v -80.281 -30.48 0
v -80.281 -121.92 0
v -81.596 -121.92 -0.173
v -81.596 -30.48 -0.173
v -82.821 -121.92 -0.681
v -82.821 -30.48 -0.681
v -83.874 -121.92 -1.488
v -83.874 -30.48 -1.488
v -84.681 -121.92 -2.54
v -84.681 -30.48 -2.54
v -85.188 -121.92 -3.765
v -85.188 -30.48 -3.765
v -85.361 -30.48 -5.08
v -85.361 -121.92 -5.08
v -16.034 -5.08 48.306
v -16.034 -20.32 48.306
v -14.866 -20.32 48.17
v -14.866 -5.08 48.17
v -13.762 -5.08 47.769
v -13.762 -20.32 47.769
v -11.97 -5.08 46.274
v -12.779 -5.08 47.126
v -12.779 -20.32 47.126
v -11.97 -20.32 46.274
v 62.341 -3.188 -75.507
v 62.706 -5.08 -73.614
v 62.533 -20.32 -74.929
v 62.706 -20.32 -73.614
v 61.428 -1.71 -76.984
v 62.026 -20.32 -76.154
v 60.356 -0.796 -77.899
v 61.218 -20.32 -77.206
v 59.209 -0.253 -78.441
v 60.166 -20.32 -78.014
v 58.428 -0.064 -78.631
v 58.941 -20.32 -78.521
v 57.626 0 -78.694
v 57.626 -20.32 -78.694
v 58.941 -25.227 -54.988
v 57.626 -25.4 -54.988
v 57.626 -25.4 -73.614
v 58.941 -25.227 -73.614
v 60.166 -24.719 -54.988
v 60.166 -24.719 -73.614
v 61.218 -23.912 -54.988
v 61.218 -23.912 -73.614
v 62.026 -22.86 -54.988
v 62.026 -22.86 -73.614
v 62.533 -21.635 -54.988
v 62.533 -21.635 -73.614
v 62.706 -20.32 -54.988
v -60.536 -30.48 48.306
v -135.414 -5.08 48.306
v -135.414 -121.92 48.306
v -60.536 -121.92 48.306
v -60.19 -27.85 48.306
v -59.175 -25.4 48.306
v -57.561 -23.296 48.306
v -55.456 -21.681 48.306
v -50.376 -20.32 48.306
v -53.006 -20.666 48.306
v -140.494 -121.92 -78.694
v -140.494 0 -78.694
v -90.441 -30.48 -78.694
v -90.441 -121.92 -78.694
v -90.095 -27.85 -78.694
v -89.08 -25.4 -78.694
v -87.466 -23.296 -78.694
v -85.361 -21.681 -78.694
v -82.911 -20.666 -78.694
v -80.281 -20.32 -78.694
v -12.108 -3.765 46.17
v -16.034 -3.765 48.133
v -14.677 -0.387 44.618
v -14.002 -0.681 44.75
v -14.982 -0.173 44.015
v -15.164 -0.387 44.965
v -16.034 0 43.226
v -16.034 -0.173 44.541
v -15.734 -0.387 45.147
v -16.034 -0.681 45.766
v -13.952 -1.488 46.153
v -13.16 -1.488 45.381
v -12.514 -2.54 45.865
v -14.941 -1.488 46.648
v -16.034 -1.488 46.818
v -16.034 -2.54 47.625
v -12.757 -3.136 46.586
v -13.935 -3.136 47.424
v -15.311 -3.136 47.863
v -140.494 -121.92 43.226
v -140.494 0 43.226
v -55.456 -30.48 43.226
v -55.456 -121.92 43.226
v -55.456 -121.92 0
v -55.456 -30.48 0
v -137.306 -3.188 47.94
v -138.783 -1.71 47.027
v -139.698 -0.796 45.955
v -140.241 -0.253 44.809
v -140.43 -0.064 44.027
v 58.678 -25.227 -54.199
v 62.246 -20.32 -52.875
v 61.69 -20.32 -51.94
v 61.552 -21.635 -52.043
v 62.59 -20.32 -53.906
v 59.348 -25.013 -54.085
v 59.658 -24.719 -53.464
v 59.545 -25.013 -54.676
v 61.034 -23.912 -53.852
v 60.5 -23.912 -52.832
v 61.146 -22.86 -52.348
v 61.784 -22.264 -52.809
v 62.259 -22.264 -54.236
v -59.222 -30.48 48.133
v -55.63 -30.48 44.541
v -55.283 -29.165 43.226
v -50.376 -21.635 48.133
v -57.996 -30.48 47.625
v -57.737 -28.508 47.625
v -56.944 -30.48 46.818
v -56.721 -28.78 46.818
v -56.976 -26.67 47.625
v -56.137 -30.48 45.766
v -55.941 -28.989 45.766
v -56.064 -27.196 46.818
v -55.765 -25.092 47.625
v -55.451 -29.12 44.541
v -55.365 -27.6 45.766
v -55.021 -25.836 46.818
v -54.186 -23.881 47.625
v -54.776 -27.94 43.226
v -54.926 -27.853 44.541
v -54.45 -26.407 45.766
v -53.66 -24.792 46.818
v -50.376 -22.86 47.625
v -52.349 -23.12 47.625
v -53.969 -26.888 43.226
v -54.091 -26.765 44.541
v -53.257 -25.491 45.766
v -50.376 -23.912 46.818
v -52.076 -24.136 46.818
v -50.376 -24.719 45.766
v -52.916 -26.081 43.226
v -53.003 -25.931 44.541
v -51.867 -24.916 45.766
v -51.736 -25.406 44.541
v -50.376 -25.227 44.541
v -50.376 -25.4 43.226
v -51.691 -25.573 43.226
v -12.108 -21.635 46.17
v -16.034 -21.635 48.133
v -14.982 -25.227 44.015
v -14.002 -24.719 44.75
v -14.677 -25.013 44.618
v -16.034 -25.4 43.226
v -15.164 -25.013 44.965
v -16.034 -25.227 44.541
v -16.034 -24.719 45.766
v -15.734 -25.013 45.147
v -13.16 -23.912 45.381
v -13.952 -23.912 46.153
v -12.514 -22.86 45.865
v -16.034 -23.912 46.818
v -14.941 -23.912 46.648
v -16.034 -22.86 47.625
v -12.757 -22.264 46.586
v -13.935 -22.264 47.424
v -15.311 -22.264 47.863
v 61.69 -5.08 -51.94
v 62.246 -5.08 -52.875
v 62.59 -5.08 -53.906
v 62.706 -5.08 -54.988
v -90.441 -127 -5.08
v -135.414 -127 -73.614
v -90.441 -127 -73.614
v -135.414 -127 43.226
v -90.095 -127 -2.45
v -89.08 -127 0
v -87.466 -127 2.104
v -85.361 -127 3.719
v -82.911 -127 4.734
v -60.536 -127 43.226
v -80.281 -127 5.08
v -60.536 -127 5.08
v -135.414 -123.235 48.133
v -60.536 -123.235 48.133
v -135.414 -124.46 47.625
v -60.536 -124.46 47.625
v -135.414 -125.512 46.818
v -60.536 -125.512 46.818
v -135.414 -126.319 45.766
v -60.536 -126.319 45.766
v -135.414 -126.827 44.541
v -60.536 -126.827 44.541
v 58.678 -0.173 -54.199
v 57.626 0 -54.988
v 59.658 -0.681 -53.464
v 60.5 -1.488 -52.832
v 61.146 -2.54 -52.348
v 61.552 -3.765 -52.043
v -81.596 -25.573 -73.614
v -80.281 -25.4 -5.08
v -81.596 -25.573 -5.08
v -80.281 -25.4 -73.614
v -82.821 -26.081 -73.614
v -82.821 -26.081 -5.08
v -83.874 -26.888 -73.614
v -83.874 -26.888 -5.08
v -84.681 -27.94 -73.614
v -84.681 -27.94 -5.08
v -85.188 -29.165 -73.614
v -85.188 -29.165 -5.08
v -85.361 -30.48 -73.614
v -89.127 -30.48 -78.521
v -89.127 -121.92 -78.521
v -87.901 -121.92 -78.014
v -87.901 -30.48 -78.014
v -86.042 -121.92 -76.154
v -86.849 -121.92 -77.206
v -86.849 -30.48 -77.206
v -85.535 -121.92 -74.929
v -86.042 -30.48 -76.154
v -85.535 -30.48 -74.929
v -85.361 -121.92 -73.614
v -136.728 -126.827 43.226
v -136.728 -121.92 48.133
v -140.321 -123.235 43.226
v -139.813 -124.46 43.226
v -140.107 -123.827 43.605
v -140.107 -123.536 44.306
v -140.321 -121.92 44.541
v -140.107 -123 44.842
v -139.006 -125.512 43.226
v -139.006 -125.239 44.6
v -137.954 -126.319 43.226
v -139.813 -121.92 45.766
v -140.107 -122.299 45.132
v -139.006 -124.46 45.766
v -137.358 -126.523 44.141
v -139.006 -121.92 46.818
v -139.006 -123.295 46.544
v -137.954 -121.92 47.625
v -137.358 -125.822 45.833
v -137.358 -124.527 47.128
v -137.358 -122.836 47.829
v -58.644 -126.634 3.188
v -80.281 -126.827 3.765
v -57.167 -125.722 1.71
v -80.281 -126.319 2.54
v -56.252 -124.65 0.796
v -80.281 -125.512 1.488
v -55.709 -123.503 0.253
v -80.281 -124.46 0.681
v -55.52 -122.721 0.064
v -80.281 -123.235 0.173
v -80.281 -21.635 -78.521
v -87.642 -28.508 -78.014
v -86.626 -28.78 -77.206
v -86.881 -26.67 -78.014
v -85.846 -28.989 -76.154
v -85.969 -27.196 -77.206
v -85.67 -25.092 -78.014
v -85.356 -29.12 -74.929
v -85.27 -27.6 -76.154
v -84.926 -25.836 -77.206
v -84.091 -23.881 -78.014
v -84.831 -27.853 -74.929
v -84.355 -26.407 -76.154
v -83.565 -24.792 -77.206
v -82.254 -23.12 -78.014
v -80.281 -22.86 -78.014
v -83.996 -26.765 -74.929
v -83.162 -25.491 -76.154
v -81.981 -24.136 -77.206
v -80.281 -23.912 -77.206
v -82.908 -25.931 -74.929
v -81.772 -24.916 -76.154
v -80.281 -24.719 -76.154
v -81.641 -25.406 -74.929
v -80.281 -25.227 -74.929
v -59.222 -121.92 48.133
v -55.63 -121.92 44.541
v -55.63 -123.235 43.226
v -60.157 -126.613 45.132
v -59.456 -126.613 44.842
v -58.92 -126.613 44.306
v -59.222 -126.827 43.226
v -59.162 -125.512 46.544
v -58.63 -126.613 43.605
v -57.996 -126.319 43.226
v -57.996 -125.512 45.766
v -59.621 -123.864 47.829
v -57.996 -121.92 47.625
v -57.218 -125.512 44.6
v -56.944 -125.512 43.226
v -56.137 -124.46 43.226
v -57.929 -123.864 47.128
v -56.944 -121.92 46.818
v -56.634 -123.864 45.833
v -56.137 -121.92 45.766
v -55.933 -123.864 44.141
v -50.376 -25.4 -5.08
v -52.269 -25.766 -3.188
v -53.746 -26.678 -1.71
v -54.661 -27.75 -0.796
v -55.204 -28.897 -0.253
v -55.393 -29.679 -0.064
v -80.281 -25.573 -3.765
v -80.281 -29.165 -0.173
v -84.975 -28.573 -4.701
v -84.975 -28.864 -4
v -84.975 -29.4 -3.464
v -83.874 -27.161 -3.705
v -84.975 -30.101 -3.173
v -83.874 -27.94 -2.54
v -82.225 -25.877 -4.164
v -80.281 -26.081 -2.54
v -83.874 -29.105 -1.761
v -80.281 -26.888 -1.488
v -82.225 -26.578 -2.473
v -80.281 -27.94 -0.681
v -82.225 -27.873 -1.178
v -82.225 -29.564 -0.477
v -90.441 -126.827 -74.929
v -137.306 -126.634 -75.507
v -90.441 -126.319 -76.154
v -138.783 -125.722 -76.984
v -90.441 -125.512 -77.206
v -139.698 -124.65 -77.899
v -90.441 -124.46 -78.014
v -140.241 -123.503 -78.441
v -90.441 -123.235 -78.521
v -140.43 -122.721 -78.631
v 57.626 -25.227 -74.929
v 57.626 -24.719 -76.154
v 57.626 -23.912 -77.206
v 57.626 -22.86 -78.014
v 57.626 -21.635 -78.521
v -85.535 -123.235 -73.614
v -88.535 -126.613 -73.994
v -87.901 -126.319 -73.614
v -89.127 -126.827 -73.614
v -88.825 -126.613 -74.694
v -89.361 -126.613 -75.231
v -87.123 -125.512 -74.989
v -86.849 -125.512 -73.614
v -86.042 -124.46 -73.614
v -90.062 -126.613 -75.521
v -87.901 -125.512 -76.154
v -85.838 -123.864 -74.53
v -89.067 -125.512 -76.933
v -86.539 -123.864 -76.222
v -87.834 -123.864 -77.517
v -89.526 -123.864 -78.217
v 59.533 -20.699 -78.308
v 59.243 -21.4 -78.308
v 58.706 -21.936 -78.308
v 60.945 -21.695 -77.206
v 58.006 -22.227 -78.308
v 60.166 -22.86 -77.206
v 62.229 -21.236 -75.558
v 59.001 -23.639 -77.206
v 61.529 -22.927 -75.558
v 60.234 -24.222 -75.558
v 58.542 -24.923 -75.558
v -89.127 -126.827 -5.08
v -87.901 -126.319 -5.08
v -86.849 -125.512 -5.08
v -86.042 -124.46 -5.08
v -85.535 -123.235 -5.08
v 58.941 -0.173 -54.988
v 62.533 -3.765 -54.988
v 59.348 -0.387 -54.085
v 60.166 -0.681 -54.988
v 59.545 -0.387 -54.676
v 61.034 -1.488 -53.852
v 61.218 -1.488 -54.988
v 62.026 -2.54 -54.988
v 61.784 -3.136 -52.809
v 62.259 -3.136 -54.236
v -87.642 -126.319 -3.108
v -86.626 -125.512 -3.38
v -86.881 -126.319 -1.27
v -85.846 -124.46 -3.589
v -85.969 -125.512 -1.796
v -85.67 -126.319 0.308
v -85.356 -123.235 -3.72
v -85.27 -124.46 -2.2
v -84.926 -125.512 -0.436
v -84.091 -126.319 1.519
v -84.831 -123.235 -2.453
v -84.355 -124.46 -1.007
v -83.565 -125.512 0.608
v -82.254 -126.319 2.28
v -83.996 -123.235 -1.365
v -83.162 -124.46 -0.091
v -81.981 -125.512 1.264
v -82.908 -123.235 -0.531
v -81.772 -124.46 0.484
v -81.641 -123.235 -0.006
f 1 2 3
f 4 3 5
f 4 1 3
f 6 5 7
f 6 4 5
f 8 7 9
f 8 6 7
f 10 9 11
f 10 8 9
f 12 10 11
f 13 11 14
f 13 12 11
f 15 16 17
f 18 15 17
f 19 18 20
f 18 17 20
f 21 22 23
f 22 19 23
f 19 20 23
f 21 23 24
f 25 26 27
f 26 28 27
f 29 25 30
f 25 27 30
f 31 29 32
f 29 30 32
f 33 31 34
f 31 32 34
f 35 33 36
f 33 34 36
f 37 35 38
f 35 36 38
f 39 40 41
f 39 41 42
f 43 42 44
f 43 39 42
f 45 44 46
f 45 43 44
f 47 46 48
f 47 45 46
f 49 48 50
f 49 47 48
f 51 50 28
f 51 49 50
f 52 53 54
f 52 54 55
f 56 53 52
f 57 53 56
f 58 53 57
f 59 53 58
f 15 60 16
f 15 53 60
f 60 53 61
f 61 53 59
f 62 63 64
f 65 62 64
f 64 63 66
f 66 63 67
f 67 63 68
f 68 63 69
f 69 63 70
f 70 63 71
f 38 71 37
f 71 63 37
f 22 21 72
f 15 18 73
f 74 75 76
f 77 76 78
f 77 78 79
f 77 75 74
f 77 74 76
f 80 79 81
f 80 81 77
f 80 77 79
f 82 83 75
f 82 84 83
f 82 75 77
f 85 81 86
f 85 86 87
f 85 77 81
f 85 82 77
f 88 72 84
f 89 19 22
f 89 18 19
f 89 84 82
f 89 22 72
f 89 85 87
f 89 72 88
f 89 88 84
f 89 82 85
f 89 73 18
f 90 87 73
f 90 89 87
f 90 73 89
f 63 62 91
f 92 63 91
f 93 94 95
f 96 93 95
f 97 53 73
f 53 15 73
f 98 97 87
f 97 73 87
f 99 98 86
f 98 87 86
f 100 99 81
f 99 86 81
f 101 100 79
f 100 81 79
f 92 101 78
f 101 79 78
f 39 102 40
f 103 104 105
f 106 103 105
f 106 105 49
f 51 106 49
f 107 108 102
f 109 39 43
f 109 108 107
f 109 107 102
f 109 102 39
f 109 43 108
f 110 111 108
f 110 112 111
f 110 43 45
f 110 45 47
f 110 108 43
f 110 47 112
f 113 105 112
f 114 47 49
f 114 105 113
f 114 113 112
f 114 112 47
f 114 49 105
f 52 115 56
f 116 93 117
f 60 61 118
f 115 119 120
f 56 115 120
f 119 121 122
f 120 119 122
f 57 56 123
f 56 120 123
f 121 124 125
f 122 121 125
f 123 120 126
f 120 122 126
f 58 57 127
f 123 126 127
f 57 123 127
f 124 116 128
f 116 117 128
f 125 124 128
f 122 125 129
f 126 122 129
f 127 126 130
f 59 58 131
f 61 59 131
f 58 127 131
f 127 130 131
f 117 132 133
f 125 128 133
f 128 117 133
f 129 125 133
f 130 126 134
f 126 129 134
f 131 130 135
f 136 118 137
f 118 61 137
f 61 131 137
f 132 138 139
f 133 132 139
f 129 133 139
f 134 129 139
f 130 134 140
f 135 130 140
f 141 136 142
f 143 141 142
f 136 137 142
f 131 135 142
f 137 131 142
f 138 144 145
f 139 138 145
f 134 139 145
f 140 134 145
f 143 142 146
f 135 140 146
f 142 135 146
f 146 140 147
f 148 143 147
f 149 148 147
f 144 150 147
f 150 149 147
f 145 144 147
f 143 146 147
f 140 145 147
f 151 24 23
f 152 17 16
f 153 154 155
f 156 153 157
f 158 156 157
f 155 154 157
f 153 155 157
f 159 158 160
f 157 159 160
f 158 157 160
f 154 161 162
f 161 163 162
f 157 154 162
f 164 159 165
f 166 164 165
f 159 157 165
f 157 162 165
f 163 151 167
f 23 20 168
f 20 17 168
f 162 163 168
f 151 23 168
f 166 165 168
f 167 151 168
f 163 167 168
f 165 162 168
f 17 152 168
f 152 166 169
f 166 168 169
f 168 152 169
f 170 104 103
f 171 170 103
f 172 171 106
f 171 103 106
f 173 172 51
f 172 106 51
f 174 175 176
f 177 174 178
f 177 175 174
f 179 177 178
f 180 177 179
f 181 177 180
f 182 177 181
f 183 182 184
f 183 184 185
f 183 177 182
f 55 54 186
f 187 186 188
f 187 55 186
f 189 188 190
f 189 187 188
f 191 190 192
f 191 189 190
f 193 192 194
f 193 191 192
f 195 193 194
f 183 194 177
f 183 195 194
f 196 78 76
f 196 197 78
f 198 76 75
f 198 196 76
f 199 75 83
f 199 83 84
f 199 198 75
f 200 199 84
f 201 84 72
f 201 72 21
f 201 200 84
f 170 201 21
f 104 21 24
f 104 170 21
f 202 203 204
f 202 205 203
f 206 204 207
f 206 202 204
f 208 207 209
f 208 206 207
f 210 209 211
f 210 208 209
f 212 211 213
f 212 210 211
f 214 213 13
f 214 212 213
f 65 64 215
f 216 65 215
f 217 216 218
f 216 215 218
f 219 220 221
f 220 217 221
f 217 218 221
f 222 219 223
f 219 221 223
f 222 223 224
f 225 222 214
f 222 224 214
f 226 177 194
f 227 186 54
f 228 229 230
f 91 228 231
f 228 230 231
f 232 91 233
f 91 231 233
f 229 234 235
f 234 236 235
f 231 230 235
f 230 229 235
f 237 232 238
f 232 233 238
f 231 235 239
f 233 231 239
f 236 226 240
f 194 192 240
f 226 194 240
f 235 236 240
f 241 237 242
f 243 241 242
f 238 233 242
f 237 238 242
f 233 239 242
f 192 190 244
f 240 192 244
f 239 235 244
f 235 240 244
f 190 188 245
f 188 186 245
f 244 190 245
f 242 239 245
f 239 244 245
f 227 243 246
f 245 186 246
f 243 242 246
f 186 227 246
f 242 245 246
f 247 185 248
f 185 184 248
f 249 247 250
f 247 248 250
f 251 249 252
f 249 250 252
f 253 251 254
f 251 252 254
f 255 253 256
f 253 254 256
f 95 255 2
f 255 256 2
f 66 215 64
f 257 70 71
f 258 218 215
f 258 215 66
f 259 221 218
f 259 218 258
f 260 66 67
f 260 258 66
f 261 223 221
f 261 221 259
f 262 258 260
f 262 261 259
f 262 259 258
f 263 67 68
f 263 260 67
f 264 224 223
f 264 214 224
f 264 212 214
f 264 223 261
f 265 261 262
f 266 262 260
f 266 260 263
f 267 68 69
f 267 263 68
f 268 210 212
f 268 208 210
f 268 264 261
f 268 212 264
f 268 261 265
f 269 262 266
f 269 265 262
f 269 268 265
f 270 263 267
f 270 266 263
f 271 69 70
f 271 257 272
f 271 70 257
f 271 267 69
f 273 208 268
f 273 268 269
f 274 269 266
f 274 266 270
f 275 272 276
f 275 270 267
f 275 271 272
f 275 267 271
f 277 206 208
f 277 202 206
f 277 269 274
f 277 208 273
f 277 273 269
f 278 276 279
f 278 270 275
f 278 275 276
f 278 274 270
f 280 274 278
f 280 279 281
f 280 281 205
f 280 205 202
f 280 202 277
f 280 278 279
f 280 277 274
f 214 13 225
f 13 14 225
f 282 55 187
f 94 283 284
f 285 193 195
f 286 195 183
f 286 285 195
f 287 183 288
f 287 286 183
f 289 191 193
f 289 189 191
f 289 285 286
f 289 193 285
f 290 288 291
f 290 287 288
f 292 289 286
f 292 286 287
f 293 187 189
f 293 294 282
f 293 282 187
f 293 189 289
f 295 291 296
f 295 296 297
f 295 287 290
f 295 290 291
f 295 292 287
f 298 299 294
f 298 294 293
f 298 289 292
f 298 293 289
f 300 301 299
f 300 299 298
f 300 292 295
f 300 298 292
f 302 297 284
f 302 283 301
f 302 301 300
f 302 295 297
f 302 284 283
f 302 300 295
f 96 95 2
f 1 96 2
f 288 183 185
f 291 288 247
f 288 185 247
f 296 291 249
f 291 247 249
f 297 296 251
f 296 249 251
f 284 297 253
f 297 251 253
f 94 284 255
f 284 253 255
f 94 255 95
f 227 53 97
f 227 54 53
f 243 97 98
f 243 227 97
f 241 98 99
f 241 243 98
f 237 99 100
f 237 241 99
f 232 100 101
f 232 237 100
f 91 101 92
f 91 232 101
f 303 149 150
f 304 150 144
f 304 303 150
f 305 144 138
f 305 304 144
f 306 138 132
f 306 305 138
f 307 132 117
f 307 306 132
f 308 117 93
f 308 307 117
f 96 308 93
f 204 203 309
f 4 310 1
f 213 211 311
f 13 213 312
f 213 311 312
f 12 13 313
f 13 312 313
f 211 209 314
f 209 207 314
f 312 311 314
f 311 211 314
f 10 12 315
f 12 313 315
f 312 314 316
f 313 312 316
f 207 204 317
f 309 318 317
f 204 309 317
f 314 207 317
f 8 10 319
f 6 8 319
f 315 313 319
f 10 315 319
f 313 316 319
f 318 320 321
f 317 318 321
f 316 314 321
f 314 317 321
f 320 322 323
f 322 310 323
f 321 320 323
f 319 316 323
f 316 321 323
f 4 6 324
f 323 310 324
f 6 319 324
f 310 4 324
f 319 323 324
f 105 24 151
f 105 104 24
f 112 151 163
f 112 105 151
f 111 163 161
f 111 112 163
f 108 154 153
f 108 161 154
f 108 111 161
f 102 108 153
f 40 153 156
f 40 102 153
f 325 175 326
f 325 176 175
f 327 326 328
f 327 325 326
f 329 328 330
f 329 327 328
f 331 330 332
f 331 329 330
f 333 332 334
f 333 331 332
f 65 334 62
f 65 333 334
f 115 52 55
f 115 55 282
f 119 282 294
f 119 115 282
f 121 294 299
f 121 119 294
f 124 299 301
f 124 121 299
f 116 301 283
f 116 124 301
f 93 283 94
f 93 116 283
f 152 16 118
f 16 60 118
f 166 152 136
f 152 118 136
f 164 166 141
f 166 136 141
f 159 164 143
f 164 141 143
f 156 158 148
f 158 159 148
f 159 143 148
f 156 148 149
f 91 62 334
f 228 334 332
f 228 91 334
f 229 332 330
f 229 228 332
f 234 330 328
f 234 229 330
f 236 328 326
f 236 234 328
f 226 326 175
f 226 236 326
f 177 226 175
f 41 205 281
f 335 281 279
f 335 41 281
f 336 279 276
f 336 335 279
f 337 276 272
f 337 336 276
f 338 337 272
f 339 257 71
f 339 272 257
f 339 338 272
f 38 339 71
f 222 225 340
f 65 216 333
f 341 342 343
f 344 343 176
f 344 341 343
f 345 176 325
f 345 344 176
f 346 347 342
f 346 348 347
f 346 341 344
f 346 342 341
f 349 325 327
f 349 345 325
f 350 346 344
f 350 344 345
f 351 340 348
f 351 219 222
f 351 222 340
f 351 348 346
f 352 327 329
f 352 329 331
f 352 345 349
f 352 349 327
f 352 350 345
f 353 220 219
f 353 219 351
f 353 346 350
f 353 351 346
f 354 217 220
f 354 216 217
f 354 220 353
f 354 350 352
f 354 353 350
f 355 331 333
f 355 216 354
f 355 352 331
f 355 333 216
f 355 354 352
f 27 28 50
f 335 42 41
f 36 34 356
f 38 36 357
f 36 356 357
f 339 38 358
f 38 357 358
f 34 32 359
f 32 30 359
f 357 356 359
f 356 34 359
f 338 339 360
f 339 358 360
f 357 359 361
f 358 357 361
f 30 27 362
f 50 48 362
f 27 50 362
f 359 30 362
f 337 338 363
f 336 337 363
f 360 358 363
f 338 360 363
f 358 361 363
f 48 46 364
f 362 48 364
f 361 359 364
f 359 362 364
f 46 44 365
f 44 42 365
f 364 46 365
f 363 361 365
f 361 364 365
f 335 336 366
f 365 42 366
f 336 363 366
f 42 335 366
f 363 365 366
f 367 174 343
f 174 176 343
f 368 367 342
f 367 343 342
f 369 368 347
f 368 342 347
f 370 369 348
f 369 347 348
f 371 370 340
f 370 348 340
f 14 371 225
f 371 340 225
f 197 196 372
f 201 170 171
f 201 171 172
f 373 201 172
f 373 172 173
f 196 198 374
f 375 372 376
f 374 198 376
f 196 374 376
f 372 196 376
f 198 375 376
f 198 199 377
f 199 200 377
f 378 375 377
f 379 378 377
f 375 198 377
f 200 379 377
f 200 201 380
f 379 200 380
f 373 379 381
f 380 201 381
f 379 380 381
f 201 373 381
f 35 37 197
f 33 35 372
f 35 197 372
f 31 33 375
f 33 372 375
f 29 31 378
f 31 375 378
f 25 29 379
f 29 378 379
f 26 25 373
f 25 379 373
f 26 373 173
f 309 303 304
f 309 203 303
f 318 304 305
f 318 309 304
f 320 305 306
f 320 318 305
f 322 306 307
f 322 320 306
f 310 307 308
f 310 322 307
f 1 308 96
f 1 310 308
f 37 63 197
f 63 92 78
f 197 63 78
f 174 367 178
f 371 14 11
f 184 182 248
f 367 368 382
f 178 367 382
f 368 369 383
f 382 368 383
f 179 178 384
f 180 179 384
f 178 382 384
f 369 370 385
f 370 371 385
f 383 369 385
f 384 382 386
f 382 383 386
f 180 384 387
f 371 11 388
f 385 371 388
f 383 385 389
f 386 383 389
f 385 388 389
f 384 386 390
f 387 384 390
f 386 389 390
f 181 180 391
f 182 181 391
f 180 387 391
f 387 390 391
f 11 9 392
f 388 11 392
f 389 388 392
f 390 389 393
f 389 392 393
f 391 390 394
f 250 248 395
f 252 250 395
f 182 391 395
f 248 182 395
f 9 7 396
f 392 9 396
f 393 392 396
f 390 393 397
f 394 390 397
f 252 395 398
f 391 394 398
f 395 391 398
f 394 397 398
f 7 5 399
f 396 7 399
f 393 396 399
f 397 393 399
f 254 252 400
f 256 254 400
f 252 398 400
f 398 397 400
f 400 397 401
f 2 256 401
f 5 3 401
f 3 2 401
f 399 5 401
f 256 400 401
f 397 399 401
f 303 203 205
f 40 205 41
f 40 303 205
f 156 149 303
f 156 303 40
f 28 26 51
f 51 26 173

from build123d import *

# Parameters (mm, degrees)
F0_W     = 203.2
F0_H     = 127
F1_DEPTH = 127
F3_DEPTH = 101.6
F4_SIZE2 = 101.6
F4_SIZE  = 76.2
F5_R     = 5.08


with BuildPart() as f1:
    # F0 (on Front) → F1 (new body)
    with BuildSketch(Plane.XZ):
        with Locations((-38.8936437666, -15.1942830797)):
            Rectangle(F0_W, F0_H)
    extrude(amount=F1_DEPTH)

    # F2 (on face) → F3 (cut)
    with BuildSketch(Plane.XZ.offset(127)):
        Polygon((62.7063562334, 48.3057169203), (-55.4564334452, 48.3057169203), (-55.4564334452, 0), (-85.3614583611, 0), (-85.3614583611, -78.6942830797), (62.7063562334, -78.6942830797), align=None)
    extrude(amount=-F3_DEPTH, mode=Mode.SUBTRACT)

    # F4
    f4_edges = [f1.edges().sort_by_distance(p)[0] for p in [
        (62.706356, -12.7, 48.305717),
    ]]
    f4_side = f1.faces().sort_by_distance((-75.879953, -52.452457, 48.305717))[0]
    chamfer(f4_edges, length=F4_SIZE, length2=F4_SIZE2, reference=f4_side)

    # F5
    f5_edges = [f1.edges().sort_by_distance(p)[0] for p in [
        (-55.456433, -76.2, 48.305717),
        (-34.475039, -25.4, 48.305717),
        (-13.493644, -12.7, 48.305717),
        (62.706356, -12.7, -53.294283),
        (24.606356, -25.4, -2.494283),
        (24.606356, 0, -2.494283),
        (62.706356, -25.4, -65.994283),
        (62.706356, -12.7, -78.694283),
        (62.706356, 0, -65.994283),
        (-55.456433, -25.4, 24.152858),
        (-70.408946, -25.4, 0),
        (-11.327551, -25.4, -78.694283),
        (-85.361458, -25.4, -39.347142),
        (-85.361458, -76.2, 0),
        (-85.361458, -76.2, -78.694283),
        (-85.361458, -127, -39.347142),
        (-97.975039, -127, 48.305717),
        (-55.456433, -127, 24.152858),
        (-70.408946, -127, 0),
        (-112.927551, -127, -78.694283),
        (-140.493644, -127, -15.194283),
        (-76.993644, 0, 48.305717),
        (-140.493644, -63.5, 48.305717),
    ]]
    fillet(f5_edges, radius=F5_R)


solid = f1.part
